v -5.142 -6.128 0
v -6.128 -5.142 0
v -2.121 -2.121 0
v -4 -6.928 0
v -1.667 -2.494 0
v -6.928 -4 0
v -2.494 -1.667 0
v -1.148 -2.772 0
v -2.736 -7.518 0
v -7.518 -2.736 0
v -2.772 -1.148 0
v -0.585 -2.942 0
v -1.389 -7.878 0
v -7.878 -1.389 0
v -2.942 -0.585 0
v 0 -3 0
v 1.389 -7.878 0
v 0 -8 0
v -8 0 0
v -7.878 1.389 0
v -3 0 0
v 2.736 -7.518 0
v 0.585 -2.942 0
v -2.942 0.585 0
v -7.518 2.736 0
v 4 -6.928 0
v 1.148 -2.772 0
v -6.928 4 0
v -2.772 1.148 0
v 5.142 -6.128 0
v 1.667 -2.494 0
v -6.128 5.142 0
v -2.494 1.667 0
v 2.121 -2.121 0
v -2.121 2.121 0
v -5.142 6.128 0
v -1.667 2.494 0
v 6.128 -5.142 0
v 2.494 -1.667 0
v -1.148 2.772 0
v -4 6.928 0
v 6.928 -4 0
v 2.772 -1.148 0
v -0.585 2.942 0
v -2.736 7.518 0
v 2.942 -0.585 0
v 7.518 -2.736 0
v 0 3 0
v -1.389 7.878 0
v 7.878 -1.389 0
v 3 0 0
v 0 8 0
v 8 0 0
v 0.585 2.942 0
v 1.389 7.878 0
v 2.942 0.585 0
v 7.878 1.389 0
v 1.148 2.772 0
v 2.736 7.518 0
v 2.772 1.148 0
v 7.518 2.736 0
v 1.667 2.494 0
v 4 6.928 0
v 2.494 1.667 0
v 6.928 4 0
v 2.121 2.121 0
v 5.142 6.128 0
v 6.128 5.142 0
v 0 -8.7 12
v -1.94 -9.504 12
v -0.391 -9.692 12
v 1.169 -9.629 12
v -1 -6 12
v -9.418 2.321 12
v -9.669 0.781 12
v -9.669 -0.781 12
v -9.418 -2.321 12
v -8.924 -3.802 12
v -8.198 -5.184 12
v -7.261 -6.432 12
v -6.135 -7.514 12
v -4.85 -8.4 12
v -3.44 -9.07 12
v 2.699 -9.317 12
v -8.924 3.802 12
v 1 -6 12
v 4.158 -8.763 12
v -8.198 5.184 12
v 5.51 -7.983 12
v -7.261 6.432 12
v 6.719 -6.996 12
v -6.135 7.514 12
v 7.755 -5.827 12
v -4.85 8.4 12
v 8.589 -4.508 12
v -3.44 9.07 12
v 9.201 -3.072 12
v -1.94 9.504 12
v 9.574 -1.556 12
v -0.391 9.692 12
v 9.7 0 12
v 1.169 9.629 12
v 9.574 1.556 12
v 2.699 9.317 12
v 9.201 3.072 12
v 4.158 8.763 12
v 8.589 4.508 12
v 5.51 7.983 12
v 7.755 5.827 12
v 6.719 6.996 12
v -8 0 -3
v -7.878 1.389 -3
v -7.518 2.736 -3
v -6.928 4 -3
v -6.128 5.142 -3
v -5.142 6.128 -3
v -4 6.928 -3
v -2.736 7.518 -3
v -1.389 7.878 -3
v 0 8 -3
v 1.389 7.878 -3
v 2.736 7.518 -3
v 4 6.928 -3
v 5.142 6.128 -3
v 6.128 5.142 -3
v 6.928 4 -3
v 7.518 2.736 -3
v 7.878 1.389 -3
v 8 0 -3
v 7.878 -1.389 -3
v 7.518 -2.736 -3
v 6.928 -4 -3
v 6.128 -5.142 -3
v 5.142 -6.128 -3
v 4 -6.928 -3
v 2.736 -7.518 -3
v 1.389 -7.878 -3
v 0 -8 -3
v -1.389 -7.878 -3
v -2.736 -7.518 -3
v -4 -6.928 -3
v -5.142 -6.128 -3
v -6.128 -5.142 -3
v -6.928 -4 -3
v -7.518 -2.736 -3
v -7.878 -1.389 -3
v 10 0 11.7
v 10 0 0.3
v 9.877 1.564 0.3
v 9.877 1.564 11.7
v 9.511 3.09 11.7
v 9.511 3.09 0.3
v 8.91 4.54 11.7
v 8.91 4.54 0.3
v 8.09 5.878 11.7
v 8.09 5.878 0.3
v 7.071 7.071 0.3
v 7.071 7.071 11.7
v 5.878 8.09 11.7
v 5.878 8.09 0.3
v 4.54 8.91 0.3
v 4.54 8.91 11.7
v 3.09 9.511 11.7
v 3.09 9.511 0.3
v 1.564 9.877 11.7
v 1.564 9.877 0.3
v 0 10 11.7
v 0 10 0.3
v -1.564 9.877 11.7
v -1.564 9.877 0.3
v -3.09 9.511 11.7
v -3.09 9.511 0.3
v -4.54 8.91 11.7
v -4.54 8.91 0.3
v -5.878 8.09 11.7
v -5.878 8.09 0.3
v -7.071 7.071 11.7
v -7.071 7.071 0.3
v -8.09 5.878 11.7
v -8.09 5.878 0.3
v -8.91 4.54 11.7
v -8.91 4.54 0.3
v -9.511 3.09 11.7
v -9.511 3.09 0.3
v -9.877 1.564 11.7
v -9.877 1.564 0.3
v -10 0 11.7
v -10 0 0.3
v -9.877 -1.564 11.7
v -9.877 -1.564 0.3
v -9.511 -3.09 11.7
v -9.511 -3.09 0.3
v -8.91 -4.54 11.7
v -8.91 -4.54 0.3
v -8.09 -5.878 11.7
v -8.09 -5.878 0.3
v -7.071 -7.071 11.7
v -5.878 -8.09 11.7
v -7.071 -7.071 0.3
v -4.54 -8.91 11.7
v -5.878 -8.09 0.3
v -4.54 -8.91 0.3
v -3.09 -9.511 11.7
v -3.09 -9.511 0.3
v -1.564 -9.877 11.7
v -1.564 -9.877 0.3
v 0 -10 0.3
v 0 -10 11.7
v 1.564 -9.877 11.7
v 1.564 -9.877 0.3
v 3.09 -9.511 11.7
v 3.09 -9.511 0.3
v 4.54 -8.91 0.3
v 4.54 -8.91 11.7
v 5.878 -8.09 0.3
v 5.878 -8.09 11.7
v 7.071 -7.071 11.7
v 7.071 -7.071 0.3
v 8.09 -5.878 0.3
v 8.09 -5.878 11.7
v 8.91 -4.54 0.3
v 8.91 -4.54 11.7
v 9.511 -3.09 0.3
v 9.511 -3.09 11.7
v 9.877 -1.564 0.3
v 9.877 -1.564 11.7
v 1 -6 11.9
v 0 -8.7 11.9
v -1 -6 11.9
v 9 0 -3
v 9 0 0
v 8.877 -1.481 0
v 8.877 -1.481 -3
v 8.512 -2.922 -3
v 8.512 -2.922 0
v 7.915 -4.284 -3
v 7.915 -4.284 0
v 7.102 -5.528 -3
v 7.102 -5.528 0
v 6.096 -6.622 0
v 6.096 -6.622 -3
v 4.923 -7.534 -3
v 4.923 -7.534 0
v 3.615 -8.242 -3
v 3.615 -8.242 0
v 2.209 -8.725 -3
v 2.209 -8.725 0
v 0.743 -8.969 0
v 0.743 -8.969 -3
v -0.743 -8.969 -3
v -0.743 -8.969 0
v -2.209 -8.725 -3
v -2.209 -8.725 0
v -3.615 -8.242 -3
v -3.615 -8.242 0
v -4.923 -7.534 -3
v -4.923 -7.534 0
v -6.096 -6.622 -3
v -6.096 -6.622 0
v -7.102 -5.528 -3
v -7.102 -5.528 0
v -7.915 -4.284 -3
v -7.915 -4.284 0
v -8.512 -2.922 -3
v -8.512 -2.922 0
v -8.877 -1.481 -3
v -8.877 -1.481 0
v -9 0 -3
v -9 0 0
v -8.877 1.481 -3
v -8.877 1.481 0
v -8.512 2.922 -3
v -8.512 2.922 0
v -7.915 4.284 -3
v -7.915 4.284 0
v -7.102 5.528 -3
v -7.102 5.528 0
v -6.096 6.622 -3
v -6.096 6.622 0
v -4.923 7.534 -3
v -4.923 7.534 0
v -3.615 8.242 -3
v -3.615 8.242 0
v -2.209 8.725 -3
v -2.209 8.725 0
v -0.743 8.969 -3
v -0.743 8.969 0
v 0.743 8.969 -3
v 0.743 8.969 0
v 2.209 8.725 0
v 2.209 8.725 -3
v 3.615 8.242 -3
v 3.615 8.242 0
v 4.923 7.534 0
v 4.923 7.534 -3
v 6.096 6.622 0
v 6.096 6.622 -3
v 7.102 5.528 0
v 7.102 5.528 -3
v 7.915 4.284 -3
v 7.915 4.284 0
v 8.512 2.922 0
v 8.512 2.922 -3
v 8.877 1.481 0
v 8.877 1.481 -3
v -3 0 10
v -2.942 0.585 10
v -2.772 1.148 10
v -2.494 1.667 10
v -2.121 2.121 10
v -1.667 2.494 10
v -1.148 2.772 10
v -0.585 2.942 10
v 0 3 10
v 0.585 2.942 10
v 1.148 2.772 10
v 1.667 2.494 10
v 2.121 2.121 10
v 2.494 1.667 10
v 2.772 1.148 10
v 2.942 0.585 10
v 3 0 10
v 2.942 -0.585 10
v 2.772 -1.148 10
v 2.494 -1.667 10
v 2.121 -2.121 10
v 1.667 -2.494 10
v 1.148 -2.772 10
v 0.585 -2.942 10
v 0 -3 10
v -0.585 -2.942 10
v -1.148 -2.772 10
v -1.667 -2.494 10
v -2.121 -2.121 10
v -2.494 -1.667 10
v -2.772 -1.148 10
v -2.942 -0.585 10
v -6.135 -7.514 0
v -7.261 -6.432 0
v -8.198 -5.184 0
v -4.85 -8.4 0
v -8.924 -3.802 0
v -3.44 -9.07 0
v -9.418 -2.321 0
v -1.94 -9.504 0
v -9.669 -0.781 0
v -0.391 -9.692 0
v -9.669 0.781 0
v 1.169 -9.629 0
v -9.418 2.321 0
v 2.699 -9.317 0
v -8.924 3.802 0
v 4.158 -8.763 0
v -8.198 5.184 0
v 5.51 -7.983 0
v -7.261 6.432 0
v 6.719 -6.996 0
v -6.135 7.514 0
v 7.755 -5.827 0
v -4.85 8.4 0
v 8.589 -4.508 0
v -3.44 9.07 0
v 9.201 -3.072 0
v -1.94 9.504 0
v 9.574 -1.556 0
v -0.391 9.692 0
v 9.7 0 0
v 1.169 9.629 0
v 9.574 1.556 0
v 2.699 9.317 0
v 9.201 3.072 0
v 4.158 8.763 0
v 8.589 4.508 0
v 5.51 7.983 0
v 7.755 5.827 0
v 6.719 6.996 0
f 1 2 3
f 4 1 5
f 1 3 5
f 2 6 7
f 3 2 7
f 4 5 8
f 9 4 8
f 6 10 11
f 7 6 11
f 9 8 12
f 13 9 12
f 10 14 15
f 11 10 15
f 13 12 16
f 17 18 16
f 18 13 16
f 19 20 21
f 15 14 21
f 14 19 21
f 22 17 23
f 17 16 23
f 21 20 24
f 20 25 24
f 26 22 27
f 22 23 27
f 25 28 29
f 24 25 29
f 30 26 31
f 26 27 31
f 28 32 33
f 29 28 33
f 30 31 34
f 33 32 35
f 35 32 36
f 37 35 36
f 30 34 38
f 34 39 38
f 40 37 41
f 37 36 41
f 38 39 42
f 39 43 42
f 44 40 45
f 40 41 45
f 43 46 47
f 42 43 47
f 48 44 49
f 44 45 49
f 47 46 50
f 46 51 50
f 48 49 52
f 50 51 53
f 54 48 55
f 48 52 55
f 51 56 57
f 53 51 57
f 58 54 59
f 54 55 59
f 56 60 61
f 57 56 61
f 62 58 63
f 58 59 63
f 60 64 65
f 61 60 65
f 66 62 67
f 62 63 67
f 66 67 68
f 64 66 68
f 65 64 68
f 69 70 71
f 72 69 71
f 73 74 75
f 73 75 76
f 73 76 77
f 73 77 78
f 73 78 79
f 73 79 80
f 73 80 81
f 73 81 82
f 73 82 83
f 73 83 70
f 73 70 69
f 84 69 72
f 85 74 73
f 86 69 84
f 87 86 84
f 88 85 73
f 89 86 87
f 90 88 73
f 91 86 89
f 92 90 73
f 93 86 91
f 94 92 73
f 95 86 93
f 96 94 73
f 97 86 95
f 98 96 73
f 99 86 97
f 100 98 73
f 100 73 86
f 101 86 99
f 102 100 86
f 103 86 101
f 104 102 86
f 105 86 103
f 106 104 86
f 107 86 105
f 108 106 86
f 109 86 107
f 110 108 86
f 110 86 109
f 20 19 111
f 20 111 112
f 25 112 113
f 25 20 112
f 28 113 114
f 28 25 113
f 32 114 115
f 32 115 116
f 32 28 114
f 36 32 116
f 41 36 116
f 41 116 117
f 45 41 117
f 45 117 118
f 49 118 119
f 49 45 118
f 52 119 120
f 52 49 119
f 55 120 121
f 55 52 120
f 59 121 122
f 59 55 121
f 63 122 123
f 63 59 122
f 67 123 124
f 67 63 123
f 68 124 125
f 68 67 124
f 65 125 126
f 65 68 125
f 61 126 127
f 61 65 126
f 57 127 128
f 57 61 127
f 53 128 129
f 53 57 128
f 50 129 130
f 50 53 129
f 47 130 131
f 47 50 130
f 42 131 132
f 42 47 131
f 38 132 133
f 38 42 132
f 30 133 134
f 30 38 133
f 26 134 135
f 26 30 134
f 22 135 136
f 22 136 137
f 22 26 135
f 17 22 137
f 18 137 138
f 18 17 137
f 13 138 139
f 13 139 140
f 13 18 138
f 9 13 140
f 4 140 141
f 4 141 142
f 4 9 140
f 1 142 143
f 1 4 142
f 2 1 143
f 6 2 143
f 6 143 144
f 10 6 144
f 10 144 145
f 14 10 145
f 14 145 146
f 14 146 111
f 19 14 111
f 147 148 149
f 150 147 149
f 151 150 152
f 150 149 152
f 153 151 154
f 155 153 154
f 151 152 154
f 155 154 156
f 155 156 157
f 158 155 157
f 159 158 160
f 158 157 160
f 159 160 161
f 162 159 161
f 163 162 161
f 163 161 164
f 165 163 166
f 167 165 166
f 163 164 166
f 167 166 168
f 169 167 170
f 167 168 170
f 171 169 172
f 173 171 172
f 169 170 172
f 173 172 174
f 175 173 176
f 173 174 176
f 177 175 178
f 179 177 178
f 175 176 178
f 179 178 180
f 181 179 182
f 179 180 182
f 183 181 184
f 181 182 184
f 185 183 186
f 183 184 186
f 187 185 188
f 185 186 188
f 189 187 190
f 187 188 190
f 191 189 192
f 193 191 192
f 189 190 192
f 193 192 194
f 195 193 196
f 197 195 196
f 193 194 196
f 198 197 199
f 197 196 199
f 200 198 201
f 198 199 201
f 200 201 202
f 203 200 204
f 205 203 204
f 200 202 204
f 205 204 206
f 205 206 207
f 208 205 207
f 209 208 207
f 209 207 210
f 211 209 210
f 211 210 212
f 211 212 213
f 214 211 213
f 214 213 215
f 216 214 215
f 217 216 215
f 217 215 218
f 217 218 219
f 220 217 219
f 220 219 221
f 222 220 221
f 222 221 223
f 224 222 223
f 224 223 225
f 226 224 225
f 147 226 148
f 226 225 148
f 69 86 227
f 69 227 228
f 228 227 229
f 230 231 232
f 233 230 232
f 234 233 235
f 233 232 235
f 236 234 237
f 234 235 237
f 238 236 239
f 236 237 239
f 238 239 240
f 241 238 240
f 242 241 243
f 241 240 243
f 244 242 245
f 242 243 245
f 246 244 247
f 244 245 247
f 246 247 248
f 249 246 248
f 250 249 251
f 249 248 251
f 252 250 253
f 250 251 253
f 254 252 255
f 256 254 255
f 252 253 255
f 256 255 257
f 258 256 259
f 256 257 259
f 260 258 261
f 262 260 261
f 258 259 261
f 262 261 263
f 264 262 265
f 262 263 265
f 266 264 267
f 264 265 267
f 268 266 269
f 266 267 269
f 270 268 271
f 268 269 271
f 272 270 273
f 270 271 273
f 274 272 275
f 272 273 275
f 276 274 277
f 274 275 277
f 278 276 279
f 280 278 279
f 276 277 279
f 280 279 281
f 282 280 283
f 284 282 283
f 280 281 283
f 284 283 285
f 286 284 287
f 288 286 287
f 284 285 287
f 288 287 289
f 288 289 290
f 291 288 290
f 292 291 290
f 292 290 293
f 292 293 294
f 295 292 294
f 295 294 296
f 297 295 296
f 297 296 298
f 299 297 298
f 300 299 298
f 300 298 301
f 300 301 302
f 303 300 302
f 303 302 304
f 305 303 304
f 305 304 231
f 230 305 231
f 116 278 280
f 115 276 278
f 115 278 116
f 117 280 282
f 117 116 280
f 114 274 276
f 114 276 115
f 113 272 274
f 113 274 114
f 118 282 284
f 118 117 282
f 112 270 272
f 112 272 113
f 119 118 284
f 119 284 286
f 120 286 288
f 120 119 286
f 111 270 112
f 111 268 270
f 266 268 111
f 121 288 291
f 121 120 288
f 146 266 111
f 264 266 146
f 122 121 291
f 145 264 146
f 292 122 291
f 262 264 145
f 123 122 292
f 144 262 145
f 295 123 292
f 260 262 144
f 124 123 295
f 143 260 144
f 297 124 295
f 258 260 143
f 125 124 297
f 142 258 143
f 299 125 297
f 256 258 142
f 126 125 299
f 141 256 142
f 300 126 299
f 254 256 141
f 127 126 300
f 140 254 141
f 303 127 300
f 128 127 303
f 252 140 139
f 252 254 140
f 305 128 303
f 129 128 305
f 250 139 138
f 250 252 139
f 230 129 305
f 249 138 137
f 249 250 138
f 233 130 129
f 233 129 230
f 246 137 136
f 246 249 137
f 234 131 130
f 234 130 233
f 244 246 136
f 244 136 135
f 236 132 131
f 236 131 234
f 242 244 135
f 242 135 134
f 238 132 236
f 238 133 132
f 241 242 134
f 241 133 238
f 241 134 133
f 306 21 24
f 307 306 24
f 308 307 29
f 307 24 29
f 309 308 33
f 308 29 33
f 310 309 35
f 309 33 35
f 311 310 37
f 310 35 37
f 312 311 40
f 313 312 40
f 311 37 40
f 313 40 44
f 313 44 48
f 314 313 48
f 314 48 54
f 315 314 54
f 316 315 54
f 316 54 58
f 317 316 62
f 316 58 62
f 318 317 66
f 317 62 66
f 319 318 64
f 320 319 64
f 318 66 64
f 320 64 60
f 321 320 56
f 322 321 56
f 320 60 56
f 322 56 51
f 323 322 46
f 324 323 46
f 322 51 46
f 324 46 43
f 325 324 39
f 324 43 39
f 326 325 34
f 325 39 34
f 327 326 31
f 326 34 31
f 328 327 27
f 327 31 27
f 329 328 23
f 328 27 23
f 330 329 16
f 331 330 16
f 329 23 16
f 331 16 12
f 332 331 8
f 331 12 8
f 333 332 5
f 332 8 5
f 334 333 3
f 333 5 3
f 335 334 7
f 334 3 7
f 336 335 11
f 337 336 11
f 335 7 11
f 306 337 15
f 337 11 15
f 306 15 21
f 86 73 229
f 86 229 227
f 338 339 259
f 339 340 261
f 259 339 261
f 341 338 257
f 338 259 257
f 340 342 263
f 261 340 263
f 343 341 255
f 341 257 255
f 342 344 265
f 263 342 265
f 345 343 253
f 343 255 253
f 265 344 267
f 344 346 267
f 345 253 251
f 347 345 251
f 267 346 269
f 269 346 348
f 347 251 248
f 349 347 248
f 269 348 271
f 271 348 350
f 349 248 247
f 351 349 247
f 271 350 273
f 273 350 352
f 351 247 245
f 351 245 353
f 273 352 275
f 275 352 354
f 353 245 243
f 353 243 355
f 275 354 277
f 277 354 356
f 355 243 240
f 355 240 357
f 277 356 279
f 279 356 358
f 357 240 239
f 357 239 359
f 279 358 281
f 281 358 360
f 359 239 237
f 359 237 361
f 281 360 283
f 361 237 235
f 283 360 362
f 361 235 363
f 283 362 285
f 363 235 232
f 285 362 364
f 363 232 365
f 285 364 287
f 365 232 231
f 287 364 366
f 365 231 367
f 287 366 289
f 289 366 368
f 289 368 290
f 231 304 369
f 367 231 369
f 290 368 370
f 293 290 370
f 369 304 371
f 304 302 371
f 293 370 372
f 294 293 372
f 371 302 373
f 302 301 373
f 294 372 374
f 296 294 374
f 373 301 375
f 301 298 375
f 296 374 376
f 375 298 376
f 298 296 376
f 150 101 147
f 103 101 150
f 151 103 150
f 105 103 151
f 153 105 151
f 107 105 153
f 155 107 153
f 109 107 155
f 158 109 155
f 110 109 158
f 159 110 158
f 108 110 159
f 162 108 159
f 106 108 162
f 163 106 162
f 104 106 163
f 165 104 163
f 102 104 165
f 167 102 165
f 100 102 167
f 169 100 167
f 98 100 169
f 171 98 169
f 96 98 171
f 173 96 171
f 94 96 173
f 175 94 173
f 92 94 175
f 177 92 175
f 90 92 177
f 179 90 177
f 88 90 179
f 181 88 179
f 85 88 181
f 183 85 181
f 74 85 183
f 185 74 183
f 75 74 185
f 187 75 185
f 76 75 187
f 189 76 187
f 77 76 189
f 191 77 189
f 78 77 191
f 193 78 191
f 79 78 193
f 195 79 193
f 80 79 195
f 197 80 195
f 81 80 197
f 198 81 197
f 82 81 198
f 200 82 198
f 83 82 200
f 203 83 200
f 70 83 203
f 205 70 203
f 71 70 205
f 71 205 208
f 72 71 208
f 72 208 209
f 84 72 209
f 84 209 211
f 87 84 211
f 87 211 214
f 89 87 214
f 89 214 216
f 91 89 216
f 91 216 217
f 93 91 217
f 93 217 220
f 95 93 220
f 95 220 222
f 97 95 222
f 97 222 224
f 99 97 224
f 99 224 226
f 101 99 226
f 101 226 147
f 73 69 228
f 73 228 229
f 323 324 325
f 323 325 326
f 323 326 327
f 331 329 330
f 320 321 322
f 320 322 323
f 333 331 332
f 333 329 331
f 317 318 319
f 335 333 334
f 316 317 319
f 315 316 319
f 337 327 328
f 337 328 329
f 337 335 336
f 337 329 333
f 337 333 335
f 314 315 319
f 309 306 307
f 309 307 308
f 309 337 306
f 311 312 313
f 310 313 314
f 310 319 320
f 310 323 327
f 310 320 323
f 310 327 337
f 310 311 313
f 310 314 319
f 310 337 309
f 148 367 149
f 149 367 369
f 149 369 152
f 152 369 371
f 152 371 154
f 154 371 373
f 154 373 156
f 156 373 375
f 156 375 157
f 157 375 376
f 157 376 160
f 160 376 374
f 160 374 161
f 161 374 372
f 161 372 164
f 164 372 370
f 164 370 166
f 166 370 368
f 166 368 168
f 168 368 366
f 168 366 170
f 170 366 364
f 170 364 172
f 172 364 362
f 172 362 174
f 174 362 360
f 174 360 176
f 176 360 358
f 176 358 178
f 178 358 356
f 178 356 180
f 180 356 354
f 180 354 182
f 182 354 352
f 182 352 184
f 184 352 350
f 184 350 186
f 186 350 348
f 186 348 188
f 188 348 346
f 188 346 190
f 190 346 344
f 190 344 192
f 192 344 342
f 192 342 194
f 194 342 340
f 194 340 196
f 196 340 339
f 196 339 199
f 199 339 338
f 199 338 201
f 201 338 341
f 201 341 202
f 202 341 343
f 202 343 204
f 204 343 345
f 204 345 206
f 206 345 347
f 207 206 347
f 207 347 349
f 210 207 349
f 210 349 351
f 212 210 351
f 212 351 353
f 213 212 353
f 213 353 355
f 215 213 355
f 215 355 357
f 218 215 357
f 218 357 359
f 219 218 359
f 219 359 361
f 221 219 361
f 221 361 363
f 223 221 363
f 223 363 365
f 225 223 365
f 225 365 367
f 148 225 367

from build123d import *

# Parameters (mm, degrees)
SKETCH1_R           = 10
BOSS_EXTRUDE1_DEPTH = 12
SKETCH2_R           = 9
SKETCH2_R_2         = 8
BOSS_EXTRUDE2_DEPTH = 3
SKETCH3_R           = 3
CUT_EXTRUDE1_DEPTH  = 10
CHAMFER1_SIZE       = 0.3
CUT_EXTRUDE2_DEPTH  = 0.1


with BuildPart() as part:
    # Sketch1 → Boss-Extrude1 (new body)
    with BuildSketch(Plane(origin=(0, 0, 0), x_dir=(0, 1, 0), z_dir=(0, 0, 1))):
        with Locations(Location((0, 0, 0), (0, 0, 270))):
            Circle(SKETCH1_R)
    extrude(amount=BOSS_EXTRUDE1_DEPTH)

    # Sketch2 → Boss-Extrude2 (add)
    with BuildSketch(Plane(origin=(0, 0, 0), x_dir=(1, 0, 0), z_dir=(0, 0, -1))):
        Circle(SKETCH2_R)
        with Locations(Location((0, 0, 0), (0, 0, 180))):
            Circle(SKETCH2_R_2, mode=Mode.SUBTRACT)
    extrude(amount=BOSS_EXTRUDE2_DEPTH)

    # Sketch3 → Cut-Extrude1 (cut)
    with BuildSketch(Plane(origin=(0, 0, 0), x_dir=(1, 0, 0), z_dir=(0, 0, -1))):
        with Locations(Location((0, 0, 0), (0, 0, 180))):
            Circle(SKETCH3_R)
    extrude(amount=-CUT_EXTRUDE1_DEPTH, mode=Mode.SUBTRACT)

    # Chamfer1
    chamfer1_edges = [part.edges().sort_by_distance(p)[0] for p in [
        (-10, 0, 0),
        (-10, 0, 12),
    ]]
    chamfer(chamfer1_edges, length=CHAMFER1_SIZE)

    # Sketch4 → Cut-Extrude2 (cut)
    with BuildSketch(Plane.XY.offset(12)):
        Polygon((-1, -6), (1, -6), (0, -8.7), align=None)
    extrude(amount=-CUT_EXTRUDE2_DEPTH, mode=Mode.SUBTRACT)


solid = part.part
